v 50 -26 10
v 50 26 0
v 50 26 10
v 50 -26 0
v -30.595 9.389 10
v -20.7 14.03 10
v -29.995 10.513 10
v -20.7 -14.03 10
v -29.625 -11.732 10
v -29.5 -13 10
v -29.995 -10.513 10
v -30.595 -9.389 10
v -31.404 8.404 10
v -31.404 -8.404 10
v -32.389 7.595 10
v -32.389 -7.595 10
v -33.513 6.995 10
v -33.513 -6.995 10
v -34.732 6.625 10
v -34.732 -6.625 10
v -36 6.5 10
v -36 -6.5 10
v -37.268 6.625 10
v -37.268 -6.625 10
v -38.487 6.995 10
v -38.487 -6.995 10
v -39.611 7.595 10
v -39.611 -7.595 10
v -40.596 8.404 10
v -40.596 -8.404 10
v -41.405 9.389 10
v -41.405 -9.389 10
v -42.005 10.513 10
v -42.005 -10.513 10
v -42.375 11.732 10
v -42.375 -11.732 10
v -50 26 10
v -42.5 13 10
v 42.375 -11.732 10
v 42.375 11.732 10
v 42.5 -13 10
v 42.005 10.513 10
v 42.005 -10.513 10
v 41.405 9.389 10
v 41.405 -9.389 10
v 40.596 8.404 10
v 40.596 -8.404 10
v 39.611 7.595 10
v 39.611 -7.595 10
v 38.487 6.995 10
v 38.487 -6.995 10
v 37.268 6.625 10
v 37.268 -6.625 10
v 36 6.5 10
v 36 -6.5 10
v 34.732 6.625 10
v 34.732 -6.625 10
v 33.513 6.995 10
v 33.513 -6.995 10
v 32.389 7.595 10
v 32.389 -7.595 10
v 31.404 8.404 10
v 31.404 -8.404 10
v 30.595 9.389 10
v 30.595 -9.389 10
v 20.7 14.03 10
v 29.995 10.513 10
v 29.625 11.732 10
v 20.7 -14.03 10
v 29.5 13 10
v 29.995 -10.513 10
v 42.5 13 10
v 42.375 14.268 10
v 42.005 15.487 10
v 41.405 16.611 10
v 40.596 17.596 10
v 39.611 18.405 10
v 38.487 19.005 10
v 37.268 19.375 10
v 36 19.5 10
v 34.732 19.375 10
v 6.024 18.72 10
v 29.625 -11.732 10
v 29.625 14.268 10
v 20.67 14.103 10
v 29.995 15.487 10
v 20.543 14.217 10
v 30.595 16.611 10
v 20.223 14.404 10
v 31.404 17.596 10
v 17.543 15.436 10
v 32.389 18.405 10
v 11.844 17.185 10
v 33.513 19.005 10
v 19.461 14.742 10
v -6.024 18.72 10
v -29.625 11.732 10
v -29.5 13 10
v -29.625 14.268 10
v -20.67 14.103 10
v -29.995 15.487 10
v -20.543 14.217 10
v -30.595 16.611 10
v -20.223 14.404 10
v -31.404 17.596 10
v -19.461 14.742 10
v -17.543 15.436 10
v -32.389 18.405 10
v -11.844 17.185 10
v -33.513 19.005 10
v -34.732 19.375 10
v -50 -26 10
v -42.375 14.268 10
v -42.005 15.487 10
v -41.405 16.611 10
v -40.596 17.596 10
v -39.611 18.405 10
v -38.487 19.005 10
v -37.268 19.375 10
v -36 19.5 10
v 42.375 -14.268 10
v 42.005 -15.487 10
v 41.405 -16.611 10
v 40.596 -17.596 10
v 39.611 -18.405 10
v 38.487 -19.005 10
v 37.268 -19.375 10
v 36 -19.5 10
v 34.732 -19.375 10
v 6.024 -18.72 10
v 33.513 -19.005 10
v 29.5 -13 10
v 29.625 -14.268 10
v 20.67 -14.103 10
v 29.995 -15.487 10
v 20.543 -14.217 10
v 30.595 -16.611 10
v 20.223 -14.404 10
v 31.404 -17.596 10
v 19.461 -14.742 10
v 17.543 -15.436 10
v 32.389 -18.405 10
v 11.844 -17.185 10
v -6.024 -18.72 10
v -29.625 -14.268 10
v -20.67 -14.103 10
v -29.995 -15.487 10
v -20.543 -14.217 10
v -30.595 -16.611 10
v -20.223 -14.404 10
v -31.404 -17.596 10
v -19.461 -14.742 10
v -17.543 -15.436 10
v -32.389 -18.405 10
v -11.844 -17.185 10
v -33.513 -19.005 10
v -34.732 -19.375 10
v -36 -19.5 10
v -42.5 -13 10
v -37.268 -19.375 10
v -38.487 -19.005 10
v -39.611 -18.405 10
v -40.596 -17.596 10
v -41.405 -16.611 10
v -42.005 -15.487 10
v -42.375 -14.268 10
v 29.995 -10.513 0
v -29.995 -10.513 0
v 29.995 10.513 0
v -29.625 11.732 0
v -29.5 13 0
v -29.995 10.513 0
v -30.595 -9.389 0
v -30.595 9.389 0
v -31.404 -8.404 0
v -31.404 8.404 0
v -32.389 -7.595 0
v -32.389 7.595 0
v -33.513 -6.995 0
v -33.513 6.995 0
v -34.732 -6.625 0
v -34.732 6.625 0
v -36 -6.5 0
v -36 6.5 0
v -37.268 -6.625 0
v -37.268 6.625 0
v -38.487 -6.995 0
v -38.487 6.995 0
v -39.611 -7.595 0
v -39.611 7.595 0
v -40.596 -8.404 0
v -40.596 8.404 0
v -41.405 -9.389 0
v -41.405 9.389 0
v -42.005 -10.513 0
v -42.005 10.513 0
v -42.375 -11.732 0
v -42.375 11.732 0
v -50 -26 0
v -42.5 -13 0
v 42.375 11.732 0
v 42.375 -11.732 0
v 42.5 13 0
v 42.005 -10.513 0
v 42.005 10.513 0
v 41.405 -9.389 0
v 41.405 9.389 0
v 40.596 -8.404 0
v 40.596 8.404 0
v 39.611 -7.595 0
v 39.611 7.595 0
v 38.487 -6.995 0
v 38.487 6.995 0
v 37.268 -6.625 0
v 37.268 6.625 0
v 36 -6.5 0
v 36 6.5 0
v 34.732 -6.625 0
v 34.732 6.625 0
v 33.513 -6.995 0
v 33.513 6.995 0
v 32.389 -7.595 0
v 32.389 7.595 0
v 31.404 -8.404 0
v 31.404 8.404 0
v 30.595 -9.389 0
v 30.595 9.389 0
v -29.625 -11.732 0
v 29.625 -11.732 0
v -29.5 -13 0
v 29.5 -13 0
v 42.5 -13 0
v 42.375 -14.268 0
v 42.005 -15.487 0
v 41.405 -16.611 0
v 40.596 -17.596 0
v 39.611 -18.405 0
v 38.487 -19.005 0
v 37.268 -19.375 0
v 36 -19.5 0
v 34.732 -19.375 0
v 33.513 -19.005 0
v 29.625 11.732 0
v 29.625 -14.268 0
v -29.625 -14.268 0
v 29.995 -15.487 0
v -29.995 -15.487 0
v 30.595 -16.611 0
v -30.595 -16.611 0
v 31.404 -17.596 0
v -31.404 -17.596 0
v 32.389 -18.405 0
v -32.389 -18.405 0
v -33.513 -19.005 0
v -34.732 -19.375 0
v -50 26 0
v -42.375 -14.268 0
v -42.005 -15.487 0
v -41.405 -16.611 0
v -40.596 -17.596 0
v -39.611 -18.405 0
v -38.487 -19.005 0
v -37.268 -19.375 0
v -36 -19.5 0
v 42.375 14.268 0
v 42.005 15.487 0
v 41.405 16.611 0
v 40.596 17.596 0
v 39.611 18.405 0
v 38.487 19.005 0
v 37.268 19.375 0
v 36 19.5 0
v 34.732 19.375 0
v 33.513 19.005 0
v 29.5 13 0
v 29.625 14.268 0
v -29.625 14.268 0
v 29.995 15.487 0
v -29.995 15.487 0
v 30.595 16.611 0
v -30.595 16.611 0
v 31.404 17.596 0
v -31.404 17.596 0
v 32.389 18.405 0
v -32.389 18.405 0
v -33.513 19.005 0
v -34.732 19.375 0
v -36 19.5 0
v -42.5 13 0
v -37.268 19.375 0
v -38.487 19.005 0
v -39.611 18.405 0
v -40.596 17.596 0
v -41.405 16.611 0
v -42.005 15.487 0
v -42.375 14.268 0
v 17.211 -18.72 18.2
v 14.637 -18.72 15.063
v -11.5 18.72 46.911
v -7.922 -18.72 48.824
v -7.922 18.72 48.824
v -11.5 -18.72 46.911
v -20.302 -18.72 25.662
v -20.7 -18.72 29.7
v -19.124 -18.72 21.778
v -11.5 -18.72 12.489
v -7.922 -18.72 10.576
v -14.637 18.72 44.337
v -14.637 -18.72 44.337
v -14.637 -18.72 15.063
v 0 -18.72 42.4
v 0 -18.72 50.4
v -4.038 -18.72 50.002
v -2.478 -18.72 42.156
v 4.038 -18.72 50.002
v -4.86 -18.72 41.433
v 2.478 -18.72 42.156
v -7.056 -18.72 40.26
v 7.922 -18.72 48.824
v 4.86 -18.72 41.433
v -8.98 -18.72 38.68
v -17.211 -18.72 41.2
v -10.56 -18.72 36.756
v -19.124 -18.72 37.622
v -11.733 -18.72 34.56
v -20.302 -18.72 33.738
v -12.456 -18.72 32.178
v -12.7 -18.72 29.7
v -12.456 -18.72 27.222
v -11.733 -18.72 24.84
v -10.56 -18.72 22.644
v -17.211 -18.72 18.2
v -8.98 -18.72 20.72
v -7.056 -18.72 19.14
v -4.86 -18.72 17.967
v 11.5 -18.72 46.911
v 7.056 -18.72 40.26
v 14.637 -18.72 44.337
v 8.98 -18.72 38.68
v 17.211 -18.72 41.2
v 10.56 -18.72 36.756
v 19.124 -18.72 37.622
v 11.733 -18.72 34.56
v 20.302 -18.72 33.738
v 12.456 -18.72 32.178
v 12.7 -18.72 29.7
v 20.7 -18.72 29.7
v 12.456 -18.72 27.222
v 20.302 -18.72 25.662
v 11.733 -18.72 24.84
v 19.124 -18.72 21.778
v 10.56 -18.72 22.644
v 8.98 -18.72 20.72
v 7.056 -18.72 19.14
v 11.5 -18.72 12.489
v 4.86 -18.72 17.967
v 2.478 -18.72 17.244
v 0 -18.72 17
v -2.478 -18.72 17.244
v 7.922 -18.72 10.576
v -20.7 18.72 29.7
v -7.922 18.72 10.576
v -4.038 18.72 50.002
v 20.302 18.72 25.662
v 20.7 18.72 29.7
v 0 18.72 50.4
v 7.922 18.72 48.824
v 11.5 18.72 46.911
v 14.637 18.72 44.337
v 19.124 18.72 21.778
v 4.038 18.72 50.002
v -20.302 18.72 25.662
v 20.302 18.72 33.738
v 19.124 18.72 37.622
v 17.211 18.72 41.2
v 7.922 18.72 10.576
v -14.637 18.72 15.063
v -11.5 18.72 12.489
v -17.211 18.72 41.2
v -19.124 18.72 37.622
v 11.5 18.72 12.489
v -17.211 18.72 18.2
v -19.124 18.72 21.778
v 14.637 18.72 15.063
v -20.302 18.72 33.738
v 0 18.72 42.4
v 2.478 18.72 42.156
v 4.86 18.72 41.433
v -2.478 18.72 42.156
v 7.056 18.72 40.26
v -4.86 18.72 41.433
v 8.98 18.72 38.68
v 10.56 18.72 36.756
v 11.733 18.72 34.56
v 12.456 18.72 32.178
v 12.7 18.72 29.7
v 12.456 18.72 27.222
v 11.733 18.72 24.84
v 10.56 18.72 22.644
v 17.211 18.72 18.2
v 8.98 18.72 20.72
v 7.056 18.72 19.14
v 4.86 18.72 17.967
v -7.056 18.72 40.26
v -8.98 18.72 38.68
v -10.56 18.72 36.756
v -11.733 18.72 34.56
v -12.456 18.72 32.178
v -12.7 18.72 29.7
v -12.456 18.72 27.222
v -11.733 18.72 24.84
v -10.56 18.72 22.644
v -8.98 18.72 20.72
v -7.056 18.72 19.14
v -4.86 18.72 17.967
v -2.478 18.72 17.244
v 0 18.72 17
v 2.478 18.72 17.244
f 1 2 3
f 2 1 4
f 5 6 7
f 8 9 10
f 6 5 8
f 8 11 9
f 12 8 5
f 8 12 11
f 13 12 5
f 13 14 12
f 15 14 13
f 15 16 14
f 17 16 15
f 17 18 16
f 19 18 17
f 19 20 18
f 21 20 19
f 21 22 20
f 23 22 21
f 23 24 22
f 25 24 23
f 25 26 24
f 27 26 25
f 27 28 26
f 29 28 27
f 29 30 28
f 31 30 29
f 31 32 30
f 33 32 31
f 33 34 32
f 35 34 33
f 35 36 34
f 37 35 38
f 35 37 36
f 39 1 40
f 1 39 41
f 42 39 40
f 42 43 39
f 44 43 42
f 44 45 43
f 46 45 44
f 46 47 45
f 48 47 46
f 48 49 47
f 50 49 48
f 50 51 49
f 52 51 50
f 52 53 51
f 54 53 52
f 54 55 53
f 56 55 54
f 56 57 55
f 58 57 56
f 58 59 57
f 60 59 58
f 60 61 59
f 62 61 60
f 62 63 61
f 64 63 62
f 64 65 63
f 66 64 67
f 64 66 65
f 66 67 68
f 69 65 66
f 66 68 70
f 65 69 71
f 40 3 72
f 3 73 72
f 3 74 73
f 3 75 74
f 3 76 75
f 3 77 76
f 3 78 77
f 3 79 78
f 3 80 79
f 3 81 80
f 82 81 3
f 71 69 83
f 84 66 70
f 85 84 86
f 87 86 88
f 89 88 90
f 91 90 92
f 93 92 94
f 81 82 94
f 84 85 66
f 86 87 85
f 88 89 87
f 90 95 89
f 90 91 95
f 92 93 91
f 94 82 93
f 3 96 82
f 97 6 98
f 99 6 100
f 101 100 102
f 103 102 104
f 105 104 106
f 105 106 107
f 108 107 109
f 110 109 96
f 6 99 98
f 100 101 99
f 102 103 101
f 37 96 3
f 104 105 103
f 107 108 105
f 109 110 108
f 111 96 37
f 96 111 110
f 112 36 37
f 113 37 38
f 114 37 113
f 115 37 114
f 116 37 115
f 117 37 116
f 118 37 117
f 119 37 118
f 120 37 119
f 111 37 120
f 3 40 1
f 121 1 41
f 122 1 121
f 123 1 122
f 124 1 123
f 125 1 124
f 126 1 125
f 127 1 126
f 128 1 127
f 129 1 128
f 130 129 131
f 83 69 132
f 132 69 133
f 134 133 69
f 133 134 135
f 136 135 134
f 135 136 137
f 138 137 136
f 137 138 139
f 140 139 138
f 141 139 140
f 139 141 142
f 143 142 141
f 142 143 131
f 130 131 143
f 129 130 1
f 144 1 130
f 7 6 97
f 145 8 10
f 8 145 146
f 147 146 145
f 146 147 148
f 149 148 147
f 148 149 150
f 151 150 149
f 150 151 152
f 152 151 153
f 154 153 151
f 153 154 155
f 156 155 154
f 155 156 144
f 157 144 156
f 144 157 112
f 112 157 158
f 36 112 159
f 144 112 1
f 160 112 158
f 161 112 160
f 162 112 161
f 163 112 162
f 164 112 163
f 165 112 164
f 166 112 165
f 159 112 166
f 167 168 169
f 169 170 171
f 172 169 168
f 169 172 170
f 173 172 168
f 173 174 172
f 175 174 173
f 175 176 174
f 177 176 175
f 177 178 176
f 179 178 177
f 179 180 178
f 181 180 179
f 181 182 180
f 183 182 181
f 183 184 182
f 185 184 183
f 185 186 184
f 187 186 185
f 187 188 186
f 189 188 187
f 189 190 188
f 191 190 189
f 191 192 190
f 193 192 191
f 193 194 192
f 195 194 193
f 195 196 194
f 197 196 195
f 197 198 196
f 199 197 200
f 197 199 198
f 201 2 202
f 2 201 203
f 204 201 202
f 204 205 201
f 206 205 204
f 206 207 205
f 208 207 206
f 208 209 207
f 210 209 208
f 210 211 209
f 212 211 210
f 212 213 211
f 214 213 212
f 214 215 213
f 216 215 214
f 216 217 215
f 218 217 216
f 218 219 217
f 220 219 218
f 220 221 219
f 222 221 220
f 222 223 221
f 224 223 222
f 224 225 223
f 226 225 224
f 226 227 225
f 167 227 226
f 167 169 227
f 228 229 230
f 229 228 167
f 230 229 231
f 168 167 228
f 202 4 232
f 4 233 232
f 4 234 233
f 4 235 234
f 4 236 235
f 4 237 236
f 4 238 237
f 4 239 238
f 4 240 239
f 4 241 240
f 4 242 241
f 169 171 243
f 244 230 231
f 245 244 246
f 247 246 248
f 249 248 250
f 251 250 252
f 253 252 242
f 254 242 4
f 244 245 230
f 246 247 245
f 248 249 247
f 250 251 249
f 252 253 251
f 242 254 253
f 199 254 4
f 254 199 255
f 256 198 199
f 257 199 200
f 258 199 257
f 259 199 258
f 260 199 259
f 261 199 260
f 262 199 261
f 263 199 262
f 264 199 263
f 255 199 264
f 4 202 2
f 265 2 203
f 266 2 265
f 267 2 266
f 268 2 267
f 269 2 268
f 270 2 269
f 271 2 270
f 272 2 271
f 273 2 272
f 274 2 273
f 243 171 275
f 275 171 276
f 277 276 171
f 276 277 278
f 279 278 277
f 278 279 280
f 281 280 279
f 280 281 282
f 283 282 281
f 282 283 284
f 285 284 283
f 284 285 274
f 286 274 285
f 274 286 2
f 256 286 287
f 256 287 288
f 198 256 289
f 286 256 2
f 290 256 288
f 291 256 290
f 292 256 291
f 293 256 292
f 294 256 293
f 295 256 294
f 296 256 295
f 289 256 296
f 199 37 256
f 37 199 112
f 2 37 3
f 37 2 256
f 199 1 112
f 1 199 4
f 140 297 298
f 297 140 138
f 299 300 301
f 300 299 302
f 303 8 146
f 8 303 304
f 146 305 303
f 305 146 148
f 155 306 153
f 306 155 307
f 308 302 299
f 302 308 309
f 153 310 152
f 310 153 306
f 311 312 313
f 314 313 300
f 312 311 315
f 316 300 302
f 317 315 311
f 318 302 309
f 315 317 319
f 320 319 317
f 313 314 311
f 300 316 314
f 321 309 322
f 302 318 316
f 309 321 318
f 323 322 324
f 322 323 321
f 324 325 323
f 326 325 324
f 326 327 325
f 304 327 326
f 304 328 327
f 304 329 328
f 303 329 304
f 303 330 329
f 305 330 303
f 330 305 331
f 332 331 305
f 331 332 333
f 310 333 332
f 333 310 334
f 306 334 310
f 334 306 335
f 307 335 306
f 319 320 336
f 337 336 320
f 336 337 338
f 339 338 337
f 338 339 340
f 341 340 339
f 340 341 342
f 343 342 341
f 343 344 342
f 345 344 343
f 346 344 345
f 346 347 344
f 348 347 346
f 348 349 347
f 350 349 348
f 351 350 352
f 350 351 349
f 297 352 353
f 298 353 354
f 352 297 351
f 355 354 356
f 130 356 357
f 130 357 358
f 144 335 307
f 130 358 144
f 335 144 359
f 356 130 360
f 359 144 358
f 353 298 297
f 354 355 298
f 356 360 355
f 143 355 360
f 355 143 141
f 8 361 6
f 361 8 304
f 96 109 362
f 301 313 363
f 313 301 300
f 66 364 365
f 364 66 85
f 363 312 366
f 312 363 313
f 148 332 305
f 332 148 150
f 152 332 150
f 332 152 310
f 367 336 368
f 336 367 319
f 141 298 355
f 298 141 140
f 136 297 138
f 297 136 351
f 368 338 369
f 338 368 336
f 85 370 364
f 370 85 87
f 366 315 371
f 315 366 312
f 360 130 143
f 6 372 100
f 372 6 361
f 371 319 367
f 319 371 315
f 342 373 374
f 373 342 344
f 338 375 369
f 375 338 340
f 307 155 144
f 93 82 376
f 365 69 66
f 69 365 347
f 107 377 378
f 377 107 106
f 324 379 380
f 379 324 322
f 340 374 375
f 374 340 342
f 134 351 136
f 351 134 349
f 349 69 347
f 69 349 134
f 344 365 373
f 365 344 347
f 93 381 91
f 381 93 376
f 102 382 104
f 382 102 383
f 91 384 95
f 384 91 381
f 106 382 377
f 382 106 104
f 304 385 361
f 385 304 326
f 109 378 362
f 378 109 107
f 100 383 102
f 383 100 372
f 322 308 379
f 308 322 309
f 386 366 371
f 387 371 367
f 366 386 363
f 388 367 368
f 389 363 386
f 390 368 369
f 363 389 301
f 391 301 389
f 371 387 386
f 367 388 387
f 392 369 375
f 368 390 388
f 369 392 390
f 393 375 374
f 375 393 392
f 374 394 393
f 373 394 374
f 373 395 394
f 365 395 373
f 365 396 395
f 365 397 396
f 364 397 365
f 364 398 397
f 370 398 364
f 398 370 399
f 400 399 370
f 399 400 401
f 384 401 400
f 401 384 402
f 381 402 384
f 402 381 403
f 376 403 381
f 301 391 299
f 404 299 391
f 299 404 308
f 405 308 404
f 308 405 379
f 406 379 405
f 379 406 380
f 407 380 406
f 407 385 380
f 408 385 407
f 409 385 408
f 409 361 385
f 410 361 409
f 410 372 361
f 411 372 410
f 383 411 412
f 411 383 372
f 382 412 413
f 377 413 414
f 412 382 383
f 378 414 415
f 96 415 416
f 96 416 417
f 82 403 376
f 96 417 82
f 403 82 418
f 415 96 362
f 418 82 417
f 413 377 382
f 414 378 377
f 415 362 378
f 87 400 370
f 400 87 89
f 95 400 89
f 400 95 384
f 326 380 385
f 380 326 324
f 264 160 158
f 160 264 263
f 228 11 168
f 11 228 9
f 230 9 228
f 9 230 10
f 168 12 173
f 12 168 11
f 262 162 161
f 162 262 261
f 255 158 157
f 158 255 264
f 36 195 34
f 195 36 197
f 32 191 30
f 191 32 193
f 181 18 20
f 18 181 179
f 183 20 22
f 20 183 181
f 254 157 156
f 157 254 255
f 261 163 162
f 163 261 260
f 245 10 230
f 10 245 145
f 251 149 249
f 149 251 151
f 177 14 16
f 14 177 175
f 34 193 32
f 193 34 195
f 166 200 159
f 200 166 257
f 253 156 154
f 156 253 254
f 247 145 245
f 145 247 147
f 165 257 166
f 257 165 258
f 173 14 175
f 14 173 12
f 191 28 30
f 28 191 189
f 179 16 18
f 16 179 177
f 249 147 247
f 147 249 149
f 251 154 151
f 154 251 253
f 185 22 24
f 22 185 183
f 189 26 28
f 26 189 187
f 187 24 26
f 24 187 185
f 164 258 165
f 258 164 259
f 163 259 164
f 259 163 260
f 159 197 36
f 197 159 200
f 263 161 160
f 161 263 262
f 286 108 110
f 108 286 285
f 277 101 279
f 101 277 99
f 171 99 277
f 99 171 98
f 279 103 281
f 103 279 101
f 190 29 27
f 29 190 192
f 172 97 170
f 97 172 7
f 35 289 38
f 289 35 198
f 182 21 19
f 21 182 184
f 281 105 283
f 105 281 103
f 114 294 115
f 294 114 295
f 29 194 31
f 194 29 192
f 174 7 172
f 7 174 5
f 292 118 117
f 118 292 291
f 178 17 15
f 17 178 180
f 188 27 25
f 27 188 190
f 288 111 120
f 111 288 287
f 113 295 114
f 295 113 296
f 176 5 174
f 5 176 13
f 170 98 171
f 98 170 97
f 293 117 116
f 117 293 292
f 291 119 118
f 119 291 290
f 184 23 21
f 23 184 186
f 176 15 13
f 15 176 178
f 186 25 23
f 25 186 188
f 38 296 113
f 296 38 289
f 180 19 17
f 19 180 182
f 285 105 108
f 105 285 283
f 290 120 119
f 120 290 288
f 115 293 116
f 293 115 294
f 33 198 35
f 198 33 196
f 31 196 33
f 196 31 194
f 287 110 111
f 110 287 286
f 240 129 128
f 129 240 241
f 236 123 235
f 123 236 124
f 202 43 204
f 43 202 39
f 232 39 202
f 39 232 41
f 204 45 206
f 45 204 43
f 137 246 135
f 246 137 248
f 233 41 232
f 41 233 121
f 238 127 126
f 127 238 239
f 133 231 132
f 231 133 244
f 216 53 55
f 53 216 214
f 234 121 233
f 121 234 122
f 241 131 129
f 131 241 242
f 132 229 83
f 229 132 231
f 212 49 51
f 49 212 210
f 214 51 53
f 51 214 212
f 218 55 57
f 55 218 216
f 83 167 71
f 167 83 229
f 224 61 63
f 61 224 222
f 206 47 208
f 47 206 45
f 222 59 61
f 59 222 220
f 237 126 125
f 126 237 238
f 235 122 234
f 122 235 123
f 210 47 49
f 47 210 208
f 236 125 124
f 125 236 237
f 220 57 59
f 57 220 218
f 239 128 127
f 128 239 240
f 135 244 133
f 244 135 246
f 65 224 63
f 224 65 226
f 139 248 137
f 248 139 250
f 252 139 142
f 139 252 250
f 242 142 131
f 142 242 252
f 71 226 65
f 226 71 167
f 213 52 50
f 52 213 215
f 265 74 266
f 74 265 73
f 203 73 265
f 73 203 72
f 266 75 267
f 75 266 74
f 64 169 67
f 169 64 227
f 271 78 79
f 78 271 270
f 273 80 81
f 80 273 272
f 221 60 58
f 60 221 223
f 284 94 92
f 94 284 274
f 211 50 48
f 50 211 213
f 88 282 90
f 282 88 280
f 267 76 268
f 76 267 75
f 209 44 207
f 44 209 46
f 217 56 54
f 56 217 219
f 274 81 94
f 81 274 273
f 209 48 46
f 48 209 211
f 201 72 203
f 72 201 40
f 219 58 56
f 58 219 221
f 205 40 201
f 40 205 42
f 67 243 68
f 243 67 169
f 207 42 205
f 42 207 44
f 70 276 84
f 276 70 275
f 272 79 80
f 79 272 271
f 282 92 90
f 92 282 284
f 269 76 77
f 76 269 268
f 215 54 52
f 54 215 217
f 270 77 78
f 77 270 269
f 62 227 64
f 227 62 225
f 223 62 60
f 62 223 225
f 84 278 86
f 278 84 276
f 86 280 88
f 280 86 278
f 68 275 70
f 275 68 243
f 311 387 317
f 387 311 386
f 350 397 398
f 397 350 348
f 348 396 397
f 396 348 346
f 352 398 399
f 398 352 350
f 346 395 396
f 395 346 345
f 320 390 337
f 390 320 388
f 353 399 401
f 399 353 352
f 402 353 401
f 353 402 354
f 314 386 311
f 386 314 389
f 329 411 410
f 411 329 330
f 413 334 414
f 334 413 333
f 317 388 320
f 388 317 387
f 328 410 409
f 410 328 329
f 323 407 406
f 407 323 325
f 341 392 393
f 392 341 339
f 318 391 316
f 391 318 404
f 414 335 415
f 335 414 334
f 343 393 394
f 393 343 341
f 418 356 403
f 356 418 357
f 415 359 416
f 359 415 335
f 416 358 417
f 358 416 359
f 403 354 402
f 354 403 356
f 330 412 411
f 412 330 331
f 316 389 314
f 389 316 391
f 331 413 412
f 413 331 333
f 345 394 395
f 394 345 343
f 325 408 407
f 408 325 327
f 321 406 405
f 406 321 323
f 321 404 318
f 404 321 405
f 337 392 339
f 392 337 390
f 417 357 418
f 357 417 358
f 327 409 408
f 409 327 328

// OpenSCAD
$fn = 32;

// ----------------------------------------------------------------------
// Bearing block: 100 x 52 mm base, 25.4 mm bore at 29.7 mm
// ----------------------------------------------------------------------

// --- parameters (mm) ---
base_w = 100;             // base width
base_d = 52;              // base depth
base_t = 10;              // base thickness
bore_d = 25.4;            // shaft / bearing bore
house_r = 20.7;           // housing outer radius
house_len = 37.44;        // housing length along the shaft
foot_w = 41.4;            // foot width under the housing
foot_len = 27.44;         // foot length along the shaft
axis_z = 29.7;            // bore axis height above the base
holes_d = 13;             // mounting holes
hole_x = 36;              // mounting hole spacing

difference() {
  union() {
    /* base plate with its underside on z = 0 */
    translate([0, 0, base_t / 2]) cube([base_w, base_d, base_t], center = true);
    /* hull foot: a straight web blending into the round housing */
    hull() {
      translate([0, 0, base_t - 0.5]) cube([foot_w, foot_len, 1.6], center = true);
      translate([0, 0, axis_z]) rotate([-90, 0, 0]) cylinder(h = house_len, d = 2 * house_r, center = true);
    }
  }
  /* bore through the housing, 2.5 mm clear on both sides */
  translate([0, 0, axis_z]) rotate([-90, 0, 0]) cylinder(h = house_len + 5, d = bore_d, center = true);
  /* mounting holes through the base plate */
  for (hx = [-36, 36]) {
    for (hy = [-13, 13]) {
      translate([hx, hy, -2.5]) cylinder(h = base_t + 5, d = holes_d);
    }
  }
}
